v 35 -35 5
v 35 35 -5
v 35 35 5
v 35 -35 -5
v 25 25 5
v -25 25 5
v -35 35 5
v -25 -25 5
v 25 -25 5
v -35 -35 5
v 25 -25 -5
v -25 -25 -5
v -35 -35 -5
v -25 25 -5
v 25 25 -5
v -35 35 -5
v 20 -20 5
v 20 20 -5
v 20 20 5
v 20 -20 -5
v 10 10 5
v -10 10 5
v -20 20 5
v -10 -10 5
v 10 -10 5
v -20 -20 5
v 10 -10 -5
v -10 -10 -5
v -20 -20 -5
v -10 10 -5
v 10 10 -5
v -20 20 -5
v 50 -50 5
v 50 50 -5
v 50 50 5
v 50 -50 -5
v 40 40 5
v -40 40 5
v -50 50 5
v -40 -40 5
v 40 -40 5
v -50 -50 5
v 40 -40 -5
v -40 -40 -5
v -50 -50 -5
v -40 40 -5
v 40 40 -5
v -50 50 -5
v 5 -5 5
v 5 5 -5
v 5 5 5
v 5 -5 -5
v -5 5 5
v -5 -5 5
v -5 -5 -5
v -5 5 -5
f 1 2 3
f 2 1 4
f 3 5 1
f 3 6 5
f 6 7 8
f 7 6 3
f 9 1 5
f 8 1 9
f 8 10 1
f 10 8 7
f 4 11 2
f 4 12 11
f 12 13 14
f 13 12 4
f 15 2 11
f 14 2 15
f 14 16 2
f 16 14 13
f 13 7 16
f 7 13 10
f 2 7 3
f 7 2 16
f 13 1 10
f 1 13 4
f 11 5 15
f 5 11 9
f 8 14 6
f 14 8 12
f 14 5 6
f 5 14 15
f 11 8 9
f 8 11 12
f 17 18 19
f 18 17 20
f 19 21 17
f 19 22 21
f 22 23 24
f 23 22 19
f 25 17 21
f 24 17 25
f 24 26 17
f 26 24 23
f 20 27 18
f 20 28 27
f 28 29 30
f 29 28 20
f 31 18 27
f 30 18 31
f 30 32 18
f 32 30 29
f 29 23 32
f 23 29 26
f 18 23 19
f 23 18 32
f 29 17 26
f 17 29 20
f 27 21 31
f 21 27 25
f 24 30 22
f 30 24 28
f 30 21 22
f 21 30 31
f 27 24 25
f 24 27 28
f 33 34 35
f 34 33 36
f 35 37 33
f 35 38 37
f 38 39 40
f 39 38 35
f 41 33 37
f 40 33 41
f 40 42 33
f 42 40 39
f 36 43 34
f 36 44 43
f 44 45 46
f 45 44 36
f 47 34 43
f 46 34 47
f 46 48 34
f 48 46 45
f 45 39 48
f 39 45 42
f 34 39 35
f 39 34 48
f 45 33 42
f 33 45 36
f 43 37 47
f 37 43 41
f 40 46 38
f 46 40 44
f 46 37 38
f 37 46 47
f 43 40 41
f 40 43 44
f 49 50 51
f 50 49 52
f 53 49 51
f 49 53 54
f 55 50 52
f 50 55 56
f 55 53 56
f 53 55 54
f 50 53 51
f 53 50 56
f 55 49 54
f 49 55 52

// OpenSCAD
extruder = 0;
spacing = 5;
size = 10;

if(extruder == 0) {
	cube(size, center=true);
	difference() {
		cube([5 * size + 4 * spacing, 5 * size + 4 * spacing, size], center=true);
		cube([3 * size + 4 * spacing, 3 * size + 4 * spacing, size + 2], center=true);
	}

	difference() {
		cube([3 * size + 2 * spacing, 3 * size + 2 * spacing, size], center=true);
		cube([size + 2 * spacing, size + 2 * spacing, size + 2], center=true);
	}
	difference() {
		cube([7 * size + 6 * spacing, 7 * size + 6 * spacing, size], center=true);
		cube([5 * size + 6 * spacing, 5 * size + 6 * spacing, size + 2], center=true);
	}
}
